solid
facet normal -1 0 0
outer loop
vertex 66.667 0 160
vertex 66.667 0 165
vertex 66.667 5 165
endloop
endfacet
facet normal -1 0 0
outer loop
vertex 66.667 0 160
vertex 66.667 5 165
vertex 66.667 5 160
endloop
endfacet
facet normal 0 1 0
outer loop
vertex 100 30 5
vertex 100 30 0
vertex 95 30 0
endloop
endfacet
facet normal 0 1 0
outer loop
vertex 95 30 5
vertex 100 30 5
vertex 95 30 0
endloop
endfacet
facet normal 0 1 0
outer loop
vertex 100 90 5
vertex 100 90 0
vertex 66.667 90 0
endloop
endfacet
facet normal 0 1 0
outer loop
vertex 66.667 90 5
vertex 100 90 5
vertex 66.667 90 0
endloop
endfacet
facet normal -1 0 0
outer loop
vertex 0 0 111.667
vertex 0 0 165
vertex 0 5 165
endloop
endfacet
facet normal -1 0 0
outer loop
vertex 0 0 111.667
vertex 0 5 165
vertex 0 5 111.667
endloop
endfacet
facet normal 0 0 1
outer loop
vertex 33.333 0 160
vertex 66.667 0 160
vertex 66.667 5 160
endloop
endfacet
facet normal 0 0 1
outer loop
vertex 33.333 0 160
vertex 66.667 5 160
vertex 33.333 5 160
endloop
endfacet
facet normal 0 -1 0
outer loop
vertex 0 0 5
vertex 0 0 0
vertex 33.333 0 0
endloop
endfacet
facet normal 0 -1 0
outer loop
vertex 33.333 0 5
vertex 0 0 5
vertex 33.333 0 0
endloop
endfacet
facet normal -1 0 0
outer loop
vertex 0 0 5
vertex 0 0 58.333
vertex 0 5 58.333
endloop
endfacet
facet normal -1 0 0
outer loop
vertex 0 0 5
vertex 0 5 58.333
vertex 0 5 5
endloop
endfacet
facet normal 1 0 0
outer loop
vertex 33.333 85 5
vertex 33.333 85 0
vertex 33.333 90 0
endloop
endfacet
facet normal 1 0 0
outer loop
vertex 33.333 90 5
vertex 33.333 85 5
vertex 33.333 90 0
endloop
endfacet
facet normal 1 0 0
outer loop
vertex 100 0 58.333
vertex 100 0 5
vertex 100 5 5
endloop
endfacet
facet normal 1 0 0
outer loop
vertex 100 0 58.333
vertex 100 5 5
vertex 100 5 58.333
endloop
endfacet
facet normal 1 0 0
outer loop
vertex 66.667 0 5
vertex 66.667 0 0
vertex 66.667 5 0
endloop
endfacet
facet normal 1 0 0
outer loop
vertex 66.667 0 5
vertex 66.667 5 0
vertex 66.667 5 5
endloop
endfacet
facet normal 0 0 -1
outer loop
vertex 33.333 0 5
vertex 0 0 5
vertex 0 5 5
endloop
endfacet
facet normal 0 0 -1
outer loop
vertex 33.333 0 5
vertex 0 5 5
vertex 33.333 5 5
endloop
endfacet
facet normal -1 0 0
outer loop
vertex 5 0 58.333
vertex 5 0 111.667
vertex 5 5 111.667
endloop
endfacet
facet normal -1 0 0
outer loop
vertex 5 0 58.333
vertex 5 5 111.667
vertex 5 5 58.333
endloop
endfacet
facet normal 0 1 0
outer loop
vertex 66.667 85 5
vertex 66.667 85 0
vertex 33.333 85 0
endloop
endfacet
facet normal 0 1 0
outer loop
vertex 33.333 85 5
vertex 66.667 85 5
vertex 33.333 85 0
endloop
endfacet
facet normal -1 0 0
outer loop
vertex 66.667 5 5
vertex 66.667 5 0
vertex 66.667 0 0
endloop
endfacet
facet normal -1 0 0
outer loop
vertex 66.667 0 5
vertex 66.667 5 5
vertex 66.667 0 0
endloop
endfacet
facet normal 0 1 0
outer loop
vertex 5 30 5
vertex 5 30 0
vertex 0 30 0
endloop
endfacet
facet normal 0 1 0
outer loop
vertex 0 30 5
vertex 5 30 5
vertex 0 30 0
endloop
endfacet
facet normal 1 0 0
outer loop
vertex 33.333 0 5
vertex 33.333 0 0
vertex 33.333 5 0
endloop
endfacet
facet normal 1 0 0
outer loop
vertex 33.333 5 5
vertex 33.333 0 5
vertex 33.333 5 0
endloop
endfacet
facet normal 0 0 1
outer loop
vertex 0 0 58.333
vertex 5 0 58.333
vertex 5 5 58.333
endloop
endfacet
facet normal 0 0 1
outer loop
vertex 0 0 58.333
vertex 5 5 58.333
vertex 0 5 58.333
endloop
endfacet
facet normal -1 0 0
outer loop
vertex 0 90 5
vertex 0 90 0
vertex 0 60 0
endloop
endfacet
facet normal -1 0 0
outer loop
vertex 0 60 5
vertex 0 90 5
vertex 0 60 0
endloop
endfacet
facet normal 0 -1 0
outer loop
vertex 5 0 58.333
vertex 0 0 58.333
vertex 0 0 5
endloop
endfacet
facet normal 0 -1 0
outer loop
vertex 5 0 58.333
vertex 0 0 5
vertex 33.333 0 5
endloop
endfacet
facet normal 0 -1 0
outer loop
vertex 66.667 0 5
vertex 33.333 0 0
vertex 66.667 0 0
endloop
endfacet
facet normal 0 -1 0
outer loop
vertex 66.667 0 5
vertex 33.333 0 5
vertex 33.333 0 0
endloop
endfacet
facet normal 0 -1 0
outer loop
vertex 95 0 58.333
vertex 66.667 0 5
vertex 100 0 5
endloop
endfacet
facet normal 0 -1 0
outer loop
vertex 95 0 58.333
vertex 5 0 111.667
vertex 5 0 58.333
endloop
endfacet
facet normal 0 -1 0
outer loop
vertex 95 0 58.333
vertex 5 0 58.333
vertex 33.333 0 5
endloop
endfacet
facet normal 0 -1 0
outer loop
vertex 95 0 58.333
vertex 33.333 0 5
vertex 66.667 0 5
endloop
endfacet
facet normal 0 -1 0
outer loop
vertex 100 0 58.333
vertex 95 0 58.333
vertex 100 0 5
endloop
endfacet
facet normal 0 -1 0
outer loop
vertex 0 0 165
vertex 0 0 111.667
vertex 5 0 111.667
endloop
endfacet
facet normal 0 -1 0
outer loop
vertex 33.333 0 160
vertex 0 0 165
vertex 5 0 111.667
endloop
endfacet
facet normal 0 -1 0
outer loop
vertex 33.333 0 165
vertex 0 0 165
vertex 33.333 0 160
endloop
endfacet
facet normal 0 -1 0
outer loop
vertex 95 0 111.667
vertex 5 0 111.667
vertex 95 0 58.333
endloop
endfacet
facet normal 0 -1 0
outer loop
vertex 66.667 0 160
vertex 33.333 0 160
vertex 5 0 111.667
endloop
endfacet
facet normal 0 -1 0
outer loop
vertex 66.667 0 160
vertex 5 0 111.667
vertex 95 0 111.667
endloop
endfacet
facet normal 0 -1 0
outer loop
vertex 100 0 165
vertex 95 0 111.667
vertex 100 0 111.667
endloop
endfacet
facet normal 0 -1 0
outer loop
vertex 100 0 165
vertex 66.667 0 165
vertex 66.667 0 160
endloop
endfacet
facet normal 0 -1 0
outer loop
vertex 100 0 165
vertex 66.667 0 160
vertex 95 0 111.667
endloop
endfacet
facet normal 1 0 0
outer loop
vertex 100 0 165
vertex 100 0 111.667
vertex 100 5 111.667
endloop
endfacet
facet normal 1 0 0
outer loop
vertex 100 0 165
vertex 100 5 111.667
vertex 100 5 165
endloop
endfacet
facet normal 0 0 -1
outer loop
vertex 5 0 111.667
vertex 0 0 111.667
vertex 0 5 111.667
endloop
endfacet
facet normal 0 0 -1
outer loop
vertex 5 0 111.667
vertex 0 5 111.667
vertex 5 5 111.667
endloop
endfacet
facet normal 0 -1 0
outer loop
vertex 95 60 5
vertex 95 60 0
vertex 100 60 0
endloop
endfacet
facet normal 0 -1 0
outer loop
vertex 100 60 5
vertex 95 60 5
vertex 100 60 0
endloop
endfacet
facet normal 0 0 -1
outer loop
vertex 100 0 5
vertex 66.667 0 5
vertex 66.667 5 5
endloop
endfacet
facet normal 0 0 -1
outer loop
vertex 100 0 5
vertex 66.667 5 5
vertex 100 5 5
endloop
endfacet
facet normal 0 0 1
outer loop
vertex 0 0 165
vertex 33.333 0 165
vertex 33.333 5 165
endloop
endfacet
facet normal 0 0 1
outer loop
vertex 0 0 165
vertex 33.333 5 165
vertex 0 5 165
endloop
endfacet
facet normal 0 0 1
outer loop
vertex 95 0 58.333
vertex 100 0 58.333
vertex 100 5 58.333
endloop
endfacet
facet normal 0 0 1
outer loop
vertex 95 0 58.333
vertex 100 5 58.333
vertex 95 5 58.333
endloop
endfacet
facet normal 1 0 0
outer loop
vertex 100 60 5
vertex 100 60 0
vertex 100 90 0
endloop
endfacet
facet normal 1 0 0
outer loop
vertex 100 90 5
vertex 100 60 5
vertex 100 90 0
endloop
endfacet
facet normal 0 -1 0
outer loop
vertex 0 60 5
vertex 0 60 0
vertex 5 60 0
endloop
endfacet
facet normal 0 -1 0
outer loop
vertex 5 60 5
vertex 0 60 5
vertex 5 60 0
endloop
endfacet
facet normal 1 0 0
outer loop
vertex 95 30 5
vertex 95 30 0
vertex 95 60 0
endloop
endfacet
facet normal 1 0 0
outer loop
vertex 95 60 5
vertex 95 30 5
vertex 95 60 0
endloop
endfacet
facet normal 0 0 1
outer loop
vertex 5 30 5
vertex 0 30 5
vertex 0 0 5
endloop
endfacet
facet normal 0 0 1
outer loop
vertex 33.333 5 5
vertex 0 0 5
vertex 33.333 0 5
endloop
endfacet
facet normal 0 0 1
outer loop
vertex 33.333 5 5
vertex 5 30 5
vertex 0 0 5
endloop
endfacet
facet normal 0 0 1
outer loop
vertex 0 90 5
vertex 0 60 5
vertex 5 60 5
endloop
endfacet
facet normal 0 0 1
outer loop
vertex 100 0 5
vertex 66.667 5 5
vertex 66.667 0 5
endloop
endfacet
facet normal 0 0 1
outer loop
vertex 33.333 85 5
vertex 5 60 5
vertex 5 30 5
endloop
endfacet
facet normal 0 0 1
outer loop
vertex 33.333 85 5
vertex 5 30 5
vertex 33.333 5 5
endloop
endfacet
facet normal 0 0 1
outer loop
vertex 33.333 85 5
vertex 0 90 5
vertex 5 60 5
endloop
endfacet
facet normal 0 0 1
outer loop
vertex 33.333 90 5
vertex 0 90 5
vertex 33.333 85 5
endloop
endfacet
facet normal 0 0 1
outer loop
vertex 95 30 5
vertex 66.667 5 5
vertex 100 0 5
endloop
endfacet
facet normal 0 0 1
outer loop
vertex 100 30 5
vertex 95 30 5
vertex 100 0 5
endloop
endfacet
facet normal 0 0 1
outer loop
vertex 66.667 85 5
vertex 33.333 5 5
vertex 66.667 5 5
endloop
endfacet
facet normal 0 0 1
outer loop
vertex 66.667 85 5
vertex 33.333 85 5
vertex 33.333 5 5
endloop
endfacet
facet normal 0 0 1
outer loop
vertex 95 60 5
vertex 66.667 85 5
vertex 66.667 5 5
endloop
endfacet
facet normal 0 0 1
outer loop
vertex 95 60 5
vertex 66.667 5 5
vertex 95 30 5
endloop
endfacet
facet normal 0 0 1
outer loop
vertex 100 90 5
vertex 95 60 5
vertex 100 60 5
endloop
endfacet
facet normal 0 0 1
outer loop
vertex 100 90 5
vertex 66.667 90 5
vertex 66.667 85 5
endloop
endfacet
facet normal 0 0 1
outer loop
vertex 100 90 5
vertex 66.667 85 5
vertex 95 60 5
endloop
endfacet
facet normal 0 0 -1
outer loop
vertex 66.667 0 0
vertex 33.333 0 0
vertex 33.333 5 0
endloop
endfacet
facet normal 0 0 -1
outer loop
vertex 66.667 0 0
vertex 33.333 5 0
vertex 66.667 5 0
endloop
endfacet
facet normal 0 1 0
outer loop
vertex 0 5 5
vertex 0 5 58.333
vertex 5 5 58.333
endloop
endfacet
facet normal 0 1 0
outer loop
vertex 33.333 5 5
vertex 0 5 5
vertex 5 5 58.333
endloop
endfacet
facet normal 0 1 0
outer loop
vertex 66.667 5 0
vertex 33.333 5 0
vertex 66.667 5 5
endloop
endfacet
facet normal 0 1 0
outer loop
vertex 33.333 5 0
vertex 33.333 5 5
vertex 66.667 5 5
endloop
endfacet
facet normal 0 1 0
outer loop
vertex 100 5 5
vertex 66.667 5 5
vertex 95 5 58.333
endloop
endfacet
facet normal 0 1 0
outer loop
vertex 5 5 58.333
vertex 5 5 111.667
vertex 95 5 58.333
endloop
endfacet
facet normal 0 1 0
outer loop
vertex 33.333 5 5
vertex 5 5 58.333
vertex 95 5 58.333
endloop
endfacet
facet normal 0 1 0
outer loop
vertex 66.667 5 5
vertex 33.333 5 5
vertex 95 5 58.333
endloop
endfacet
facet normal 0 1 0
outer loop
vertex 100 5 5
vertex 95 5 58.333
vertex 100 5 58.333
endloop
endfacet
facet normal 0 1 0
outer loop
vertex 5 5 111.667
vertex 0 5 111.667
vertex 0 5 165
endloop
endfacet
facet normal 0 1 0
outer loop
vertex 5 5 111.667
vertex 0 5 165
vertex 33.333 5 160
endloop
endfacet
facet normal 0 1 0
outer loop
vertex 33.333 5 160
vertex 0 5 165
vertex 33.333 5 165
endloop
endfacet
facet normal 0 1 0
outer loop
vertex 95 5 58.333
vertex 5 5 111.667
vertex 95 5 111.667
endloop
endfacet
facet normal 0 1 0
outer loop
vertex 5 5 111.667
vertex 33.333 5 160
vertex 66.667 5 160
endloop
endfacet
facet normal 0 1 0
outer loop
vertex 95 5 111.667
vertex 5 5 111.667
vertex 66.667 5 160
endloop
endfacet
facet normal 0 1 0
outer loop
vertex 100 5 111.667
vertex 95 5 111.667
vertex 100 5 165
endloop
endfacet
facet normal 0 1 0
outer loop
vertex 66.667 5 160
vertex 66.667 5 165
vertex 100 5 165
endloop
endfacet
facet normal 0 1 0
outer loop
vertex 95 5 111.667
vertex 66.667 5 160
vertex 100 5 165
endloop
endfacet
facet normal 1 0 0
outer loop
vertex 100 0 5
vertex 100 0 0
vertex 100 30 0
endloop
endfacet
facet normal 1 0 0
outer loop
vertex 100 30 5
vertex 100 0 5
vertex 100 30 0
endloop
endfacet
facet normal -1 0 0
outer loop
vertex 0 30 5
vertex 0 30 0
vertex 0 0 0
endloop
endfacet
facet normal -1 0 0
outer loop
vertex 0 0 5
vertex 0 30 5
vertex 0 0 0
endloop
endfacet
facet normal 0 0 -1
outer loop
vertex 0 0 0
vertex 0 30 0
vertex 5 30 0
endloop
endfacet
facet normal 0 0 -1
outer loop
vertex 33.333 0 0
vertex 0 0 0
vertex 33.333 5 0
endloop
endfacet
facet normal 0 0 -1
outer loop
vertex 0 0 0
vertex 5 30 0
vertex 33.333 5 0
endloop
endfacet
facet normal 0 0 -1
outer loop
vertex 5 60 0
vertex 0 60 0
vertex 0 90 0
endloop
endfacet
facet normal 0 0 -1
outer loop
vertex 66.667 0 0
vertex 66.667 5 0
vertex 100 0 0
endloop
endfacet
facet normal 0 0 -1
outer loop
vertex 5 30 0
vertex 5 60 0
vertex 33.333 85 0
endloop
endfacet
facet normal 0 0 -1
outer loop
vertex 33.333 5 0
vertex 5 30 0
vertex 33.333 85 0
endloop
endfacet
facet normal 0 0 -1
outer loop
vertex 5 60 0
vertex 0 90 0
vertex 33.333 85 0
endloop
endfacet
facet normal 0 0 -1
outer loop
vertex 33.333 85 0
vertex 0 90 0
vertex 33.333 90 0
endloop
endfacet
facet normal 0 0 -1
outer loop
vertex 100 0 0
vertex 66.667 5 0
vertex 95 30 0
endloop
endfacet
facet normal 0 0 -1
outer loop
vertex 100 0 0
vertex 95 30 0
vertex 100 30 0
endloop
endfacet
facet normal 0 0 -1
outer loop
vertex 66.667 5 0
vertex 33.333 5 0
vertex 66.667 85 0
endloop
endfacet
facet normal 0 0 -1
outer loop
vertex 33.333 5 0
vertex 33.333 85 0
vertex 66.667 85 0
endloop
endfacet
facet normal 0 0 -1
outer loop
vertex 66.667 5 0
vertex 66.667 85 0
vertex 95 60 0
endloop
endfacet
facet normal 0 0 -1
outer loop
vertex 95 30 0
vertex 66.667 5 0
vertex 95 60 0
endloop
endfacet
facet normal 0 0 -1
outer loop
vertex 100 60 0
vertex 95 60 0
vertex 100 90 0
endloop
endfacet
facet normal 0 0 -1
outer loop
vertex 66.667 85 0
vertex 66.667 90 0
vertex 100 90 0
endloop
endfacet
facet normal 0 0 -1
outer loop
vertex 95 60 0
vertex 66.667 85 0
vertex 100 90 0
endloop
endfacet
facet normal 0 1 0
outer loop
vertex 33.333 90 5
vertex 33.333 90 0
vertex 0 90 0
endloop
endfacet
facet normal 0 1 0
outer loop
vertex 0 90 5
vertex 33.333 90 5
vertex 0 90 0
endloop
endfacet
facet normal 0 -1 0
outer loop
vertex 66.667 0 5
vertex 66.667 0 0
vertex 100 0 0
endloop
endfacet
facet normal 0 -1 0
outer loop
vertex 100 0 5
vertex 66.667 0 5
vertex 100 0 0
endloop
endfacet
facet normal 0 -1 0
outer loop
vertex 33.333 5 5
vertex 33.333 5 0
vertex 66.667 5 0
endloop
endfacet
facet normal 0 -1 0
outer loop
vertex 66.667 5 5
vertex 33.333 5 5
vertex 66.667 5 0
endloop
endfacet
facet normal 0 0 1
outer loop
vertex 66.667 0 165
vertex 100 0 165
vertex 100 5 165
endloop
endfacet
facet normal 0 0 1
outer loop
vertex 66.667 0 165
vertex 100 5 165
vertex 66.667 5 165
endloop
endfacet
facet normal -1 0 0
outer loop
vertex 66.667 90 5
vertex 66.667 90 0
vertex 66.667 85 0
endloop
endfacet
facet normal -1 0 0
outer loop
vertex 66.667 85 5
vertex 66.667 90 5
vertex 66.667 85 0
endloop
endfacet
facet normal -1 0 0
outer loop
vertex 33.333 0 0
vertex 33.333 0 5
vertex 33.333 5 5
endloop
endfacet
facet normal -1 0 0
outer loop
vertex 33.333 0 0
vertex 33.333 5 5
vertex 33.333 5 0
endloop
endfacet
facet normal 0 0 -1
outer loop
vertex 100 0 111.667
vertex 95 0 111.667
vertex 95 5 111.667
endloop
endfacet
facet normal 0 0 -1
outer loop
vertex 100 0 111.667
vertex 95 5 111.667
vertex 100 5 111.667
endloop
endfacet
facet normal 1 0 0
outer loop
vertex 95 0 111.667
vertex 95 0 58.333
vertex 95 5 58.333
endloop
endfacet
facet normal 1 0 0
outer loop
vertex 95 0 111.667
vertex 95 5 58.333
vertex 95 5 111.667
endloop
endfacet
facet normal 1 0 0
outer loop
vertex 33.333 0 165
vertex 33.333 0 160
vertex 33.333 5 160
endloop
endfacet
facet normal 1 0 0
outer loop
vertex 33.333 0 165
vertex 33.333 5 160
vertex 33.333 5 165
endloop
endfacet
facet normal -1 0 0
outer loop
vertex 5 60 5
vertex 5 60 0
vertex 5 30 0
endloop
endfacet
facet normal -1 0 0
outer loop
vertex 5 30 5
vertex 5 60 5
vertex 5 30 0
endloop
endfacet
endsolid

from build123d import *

# Parameters (mm, degrees)
EXTRUDE_DEPTH    = 5
EXTRUDE001_DEPTH = 5


with BuildPart() as base:
    # Sketch → Extrude (new body)
    with BuildSketch(Plane.XY):
        Polygon((0, 30), (0, 0), (33.333333, 0), (33.333333, 5), (66.666667, 5), (66.666667, 0), (100, 0), (100, 30), (95, 30), (95, 60), (100, 60), (100, 90), (66.666667, 90), (66.666667, 85), (33.333333, 85), (33.333333, 90), (0, 90), (0, 60), (5, 60), (5, 30), align=None)
    extrude(amount=EXTRUDE_DEPTH)


with BuildPart() as frontal:
    # Sketch001 → Extrude001 (new body)
    with BuildSketch(Plane.XZ):
        Polygon((33.333333, 0), (66.666667, 0), (66.666667, 5), (100, 5), (100, 58.333333), (95, 58.333333), (95, 111.666667), (100, 111.666667), (100, 165), (66.666667, 165), (66.666667, 160), (33.333333, 160), (33.333333, 165), (0, 165), (0, 111.666667), (5, 111.666667), (5, 58.333333), (0, 58.333333), (0, 5), (33.333333, 5), align=None)
    extrude(amount=-EXTRUDE001_DEPTH)


solid = Compound([base.part, frontal.part])
